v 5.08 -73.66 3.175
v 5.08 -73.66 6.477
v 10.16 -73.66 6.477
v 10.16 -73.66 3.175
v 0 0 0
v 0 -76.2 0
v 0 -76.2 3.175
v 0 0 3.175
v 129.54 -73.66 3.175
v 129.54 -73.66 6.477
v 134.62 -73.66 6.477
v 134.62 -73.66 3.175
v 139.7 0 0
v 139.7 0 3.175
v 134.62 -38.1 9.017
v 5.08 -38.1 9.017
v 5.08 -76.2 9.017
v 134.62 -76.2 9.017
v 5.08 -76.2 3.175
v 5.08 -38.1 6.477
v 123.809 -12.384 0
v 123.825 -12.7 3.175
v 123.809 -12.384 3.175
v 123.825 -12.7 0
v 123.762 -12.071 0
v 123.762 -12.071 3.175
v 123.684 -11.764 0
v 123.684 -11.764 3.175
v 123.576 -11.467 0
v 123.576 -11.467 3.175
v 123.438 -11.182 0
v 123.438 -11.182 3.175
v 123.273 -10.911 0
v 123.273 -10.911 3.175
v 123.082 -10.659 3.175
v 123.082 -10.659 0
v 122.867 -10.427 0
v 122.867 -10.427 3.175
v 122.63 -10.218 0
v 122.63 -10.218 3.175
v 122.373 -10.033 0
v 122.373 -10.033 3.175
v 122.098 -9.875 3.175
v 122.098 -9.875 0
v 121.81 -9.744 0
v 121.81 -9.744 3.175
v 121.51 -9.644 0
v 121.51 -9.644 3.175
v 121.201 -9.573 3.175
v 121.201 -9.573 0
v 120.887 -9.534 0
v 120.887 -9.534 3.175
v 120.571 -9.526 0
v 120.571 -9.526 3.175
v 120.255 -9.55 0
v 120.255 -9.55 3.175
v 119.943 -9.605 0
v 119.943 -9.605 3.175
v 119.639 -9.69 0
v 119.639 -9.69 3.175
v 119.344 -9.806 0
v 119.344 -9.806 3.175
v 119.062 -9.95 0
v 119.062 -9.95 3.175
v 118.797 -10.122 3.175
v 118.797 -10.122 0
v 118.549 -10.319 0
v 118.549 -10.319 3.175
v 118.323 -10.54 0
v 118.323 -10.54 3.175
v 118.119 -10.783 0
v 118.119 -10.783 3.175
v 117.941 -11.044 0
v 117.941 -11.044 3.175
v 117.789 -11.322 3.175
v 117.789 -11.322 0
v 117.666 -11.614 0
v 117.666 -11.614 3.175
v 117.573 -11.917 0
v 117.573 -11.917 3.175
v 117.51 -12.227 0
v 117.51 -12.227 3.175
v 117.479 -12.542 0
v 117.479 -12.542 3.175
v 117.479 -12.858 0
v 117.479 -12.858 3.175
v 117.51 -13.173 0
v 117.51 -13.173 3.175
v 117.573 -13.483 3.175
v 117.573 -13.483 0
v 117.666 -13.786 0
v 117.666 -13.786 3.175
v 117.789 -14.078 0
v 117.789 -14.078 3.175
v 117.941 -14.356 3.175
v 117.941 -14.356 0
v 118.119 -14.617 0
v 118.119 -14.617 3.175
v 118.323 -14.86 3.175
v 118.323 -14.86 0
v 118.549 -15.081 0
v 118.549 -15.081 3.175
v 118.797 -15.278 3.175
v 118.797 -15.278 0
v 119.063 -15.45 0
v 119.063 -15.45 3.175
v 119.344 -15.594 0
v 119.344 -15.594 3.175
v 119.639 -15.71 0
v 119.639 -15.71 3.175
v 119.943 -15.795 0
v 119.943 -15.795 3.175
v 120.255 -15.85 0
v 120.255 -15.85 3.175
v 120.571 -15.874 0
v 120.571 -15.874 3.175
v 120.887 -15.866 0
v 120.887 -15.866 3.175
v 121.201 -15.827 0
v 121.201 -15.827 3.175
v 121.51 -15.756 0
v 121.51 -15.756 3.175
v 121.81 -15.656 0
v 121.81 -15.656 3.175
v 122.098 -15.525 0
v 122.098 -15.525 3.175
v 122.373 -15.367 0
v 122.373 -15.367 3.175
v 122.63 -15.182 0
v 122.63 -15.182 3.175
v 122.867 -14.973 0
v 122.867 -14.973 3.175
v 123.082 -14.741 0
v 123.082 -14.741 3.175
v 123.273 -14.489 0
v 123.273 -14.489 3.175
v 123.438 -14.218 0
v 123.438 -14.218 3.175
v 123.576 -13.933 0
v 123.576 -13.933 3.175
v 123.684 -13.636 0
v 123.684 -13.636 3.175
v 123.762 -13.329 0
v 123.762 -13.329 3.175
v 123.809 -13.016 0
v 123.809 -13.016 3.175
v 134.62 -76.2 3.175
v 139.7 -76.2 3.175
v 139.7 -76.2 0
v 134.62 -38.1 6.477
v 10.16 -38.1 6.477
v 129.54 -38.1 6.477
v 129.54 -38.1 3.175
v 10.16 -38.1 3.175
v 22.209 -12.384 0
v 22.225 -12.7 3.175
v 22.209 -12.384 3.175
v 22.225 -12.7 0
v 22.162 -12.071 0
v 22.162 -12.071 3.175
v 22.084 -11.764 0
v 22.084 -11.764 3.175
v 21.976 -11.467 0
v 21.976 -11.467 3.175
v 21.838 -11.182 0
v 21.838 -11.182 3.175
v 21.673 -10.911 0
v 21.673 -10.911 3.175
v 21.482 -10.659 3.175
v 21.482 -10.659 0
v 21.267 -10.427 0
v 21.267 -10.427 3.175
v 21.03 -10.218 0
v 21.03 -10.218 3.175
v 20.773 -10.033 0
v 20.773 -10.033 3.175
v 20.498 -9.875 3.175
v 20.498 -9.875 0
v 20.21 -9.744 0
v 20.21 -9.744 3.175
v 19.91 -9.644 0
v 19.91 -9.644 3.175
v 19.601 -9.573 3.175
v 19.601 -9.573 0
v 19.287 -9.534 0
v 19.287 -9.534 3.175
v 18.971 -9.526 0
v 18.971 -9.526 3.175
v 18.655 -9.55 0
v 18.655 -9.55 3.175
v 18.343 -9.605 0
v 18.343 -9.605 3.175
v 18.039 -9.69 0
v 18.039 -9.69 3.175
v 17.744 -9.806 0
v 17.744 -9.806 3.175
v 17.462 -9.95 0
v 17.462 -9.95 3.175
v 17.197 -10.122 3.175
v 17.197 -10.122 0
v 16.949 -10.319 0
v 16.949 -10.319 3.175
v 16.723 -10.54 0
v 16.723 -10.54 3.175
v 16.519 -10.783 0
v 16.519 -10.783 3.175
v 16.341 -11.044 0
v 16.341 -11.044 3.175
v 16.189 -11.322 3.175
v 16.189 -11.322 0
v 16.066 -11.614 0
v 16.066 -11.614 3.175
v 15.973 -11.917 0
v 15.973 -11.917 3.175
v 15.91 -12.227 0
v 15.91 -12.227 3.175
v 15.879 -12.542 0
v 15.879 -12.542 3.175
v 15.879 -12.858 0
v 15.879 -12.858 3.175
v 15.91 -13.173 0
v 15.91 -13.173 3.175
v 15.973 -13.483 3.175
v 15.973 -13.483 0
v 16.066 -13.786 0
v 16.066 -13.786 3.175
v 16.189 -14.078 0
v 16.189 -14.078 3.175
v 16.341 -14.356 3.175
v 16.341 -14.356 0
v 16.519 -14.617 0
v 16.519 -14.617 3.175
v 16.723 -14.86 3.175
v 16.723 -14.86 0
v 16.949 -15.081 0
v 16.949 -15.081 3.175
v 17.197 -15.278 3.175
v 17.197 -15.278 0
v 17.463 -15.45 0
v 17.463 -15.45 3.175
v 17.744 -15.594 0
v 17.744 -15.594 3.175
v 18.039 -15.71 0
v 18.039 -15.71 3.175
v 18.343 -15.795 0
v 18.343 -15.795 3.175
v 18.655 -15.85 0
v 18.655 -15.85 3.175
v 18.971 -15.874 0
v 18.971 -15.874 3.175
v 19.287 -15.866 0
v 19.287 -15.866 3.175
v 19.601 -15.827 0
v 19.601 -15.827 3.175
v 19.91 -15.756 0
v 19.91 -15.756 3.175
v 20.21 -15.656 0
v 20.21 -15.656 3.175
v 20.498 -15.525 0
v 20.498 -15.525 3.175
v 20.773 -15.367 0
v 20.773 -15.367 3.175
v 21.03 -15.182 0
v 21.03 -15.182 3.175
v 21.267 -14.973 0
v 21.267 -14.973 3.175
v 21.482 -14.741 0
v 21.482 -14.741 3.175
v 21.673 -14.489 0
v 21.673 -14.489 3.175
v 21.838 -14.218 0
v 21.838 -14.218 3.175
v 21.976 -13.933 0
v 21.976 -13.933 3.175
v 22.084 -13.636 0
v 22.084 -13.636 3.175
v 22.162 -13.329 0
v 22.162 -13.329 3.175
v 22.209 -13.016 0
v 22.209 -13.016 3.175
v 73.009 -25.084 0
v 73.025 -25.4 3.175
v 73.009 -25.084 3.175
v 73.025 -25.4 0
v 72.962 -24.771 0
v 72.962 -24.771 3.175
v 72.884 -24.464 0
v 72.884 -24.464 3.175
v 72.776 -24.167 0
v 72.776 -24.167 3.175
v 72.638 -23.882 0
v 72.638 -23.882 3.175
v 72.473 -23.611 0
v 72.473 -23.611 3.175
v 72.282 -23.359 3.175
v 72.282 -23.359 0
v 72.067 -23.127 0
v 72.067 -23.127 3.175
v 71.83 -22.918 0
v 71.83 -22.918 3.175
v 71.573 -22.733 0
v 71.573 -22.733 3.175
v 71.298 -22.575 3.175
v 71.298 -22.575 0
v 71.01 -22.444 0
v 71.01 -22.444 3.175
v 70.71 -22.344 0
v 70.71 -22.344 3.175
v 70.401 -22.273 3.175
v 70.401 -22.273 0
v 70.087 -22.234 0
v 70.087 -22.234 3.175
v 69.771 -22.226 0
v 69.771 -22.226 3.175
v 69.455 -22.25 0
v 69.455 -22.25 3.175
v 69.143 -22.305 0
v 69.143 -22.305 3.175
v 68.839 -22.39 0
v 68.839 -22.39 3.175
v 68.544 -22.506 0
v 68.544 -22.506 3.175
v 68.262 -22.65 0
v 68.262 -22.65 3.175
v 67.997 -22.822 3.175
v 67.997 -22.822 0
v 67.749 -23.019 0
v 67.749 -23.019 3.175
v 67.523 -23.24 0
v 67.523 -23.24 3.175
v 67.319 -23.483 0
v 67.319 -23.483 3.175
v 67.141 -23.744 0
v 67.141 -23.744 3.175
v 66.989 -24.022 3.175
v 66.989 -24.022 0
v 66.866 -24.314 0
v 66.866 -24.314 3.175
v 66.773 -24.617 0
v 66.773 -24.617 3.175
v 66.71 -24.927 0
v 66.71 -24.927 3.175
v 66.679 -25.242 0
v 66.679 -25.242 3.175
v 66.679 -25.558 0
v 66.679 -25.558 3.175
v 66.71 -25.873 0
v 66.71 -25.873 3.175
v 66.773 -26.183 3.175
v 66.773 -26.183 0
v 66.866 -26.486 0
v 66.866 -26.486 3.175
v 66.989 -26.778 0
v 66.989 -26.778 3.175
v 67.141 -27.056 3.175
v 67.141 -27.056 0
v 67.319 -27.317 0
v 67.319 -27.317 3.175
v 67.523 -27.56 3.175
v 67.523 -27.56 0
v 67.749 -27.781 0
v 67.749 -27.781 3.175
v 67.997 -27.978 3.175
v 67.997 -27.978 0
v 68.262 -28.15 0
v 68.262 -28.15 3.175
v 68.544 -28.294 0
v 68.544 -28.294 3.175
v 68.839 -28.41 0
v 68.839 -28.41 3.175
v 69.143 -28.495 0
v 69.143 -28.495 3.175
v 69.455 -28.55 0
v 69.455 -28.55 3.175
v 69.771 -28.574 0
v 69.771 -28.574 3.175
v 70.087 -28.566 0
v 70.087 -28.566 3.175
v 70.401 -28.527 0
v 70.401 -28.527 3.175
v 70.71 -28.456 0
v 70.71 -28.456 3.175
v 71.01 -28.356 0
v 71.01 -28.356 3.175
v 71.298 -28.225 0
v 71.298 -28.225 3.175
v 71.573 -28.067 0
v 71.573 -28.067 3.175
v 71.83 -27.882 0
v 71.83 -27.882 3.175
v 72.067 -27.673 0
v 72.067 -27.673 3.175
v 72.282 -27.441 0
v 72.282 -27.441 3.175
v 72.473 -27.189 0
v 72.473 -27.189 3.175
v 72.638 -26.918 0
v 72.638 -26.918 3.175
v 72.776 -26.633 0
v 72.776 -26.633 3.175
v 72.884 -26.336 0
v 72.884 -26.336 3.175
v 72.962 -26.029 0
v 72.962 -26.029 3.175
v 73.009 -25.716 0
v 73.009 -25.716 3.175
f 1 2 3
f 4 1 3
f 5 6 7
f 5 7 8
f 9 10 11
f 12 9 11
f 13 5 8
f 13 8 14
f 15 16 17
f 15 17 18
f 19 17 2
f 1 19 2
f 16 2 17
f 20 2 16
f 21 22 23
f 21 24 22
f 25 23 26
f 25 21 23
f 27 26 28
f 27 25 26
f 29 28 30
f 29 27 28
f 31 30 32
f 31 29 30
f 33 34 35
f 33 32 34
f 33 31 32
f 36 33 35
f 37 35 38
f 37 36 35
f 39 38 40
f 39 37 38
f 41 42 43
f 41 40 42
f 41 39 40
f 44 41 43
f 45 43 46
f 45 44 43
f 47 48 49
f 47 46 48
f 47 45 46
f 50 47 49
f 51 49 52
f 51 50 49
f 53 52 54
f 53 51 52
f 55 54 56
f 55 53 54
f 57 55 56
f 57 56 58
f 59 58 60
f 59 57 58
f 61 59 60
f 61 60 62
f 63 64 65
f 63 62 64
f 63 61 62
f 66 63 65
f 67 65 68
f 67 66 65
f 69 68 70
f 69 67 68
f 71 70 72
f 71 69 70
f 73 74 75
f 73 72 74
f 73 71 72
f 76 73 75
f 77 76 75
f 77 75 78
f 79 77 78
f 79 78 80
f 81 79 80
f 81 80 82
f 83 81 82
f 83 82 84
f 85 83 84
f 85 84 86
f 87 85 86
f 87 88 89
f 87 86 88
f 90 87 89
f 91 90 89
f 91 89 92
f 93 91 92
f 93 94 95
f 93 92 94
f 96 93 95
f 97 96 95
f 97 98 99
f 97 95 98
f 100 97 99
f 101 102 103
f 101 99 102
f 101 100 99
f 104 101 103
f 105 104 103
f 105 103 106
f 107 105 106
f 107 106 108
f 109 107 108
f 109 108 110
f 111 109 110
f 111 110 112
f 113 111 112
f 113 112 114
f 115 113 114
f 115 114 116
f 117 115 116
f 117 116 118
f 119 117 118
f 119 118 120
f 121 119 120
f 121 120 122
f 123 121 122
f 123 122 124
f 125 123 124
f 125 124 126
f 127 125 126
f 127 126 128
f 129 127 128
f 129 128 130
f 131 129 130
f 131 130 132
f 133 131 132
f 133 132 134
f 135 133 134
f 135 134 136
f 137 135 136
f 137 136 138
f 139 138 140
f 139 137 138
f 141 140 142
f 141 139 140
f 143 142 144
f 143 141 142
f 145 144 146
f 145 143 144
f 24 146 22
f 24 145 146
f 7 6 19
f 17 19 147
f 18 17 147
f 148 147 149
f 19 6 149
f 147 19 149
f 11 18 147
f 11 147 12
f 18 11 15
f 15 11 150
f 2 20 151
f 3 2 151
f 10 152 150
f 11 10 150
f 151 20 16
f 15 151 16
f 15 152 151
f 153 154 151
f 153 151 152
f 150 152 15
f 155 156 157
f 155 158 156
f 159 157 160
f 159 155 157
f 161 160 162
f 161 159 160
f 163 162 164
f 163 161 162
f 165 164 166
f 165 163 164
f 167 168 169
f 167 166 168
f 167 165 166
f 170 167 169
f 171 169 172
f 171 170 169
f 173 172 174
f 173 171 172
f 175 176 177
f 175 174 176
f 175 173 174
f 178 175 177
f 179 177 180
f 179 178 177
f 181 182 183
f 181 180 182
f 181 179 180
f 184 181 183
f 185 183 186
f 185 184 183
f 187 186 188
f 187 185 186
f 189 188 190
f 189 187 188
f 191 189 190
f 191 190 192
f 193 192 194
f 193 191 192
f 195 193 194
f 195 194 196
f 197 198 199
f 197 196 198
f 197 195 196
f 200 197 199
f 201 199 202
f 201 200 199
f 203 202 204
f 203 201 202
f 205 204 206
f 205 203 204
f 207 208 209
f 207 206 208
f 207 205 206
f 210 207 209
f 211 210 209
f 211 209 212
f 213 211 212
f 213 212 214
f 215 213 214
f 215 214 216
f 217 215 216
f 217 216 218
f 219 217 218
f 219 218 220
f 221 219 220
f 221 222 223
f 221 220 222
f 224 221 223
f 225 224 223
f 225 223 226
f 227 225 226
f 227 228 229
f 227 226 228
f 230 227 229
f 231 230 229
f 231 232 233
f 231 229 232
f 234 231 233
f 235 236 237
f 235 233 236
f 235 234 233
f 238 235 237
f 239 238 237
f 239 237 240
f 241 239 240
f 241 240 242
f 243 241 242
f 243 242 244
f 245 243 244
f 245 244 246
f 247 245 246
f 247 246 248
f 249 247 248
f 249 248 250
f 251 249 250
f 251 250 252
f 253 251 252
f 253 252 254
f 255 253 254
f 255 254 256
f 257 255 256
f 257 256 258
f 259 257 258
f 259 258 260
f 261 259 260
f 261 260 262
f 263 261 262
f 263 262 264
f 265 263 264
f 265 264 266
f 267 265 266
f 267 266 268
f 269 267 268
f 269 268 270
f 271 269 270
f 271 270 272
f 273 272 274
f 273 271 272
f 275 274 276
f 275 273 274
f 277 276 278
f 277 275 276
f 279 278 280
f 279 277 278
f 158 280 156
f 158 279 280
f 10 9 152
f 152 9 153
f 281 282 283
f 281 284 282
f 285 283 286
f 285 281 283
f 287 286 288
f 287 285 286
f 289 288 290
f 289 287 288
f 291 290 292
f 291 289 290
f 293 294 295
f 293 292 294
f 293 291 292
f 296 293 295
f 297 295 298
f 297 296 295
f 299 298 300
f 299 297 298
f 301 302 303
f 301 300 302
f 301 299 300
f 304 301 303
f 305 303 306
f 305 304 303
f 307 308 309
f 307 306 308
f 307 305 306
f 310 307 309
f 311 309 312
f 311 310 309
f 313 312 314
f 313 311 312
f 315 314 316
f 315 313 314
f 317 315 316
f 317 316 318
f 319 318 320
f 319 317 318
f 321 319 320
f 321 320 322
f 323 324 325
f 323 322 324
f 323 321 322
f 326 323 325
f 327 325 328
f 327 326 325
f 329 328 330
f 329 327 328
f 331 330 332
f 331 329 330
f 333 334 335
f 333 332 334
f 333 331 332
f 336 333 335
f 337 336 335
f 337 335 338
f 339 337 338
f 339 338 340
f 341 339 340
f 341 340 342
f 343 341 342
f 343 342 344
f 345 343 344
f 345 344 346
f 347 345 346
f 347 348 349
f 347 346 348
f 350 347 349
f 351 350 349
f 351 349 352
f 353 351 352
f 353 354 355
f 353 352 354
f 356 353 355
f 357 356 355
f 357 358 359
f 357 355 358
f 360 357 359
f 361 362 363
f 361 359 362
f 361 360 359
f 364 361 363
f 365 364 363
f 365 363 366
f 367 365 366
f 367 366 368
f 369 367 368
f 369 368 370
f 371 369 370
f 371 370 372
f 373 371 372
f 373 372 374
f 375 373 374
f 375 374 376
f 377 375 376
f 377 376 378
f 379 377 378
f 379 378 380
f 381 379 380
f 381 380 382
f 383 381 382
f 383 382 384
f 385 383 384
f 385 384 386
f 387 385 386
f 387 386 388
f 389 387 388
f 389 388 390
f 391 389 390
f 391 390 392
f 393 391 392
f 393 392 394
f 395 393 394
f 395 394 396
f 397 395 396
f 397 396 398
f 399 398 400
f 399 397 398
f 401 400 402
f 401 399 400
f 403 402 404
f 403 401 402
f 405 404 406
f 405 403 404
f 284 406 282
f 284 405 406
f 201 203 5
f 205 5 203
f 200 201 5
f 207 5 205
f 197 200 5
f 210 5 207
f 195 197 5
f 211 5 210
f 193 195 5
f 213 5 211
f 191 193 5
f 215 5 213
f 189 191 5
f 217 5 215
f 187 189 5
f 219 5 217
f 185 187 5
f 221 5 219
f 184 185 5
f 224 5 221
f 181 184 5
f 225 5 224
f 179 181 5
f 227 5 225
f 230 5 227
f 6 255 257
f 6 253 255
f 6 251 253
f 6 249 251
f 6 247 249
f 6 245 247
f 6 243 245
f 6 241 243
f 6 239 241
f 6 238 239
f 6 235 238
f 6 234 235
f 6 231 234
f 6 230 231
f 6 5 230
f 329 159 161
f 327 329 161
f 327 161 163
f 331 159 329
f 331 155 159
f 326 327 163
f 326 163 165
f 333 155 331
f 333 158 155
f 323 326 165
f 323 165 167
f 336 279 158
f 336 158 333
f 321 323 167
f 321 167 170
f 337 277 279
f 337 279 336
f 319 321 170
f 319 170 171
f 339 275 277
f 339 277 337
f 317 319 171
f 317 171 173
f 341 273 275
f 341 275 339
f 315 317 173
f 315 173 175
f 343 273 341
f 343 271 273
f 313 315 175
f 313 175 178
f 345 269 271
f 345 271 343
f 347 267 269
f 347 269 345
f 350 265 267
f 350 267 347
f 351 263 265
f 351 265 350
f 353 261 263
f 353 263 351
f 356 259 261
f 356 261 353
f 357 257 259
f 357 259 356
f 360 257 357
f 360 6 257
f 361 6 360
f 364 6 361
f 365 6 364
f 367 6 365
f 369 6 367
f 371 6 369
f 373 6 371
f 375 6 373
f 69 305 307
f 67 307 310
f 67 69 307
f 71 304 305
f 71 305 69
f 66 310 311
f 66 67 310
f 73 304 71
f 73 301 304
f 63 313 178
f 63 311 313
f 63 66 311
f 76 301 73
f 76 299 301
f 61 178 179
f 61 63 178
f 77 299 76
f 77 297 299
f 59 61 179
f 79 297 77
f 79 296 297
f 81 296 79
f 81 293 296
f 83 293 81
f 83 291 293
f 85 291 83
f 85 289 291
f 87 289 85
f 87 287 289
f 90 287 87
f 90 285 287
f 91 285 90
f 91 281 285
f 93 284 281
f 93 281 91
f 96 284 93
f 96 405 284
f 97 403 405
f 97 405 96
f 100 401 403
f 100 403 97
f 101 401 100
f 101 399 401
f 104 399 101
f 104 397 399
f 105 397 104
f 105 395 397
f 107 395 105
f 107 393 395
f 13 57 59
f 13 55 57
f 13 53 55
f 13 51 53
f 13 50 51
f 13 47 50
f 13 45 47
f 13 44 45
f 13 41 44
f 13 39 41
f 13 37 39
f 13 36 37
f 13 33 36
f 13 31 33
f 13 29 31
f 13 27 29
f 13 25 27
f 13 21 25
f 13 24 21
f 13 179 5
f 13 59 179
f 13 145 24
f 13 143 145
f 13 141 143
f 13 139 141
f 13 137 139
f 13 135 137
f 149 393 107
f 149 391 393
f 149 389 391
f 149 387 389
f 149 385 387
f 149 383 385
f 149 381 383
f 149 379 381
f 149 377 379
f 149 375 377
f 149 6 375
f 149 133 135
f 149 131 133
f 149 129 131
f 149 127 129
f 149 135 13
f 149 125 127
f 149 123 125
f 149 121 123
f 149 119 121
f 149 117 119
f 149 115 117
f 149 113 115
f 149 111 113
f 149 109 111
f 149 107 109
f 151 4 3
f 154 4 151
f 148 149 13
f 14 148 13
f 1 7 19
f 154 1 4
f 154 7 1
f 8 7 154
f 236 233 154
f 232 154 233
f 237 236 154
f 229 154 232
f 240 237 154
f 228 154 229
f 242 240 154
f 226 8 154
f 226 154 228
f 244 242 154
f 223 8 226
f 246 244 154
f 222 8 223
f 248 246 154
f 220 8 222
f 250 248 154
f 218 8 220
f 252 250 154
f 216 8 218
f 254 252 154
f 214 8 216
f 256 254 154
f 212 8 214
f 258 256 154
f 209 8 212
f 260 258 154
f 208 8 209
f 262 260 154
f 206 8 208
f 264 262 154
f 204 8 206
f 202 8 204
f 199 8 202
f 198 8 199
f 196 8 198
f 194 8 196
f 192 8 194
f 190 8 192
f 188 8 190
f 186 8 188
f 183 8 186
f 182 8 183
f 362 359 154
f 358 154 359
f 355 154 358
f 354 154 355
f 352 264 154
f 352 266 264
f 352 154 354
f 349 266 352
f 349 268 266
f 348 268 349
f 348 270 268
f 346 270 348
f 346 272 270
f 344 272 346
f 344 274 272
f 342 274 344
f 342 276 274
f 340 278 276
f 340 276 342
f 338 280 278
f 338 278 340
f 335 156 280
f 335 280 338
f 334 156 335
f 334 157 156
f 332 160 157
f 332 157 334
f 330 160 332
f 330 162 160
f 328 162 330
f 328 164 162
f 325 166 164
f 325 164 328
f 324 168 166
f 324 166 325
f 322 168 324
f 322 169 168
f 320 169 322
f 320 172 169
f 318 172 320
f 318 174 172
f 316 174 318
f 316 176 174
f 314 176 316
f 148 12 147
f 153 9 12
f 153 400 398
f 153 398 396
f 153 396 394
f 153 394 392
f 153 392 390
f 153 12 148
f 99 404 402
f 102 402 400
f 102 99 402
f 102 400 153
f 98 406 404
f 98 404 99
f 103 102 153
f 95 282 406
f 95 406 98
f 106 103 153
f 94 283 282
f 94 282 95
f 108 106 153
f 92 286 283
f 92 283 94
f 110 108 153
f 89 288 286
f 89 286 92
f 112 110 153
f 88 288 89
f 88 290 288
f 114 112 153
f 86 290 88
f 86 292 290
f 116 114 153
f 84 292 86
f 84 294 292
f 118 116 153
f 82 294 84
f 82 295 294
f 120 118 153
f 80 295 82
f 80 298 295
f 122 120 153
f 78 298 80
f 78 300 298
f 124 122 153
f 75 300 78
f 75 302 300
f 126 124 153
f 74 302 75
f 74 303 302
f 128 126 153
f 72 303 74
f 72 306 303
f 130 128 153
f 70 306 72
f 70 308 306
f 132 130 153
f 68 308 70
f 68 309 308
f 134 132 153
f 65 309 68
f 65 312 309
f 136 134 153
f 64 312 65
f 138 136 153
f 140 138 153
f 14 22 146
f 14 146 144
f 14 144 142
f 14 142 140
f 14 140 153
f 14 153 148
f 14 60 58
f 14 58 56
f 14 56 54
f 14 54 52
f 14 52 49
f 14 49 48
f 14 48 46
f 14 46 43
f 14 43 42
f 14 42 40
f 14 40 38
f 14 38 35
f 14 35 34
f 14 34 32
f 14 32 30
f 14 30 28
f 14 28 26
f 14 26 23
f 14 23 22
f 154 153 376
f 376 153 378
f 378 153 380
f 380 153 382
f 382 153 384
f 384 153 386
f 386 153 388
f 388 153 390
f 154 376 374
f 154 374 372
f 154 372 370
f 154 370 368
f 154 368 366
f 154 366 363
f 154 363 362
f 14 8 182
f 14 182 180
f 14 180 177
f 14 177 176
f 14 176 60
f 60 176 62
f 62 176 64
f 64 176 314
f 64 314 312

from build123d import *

# Parameters (mm, degrees)
SKETCH3_W               = 139.7
SKETCH3_H               = 76.2
BOSS_EXTRUDE1_DEPTH     = 3.175
SKETCH4_W               = 119.38
SKETCH4_H               = 38.1
BOSS_EXTRUDE2_DEPTH     = 3.302
SKETCH6_W               = 129.54
SKETCH6_H               = 38.1
BOSS_EXTRUDE3_DEPTH     = 2.54
SKETCH7_W               = 129.54
SKETCH7_H               = 9.017
BOSS_EXTRUDE4_DEPTH     = 2.54
CUT_EXTRUDE1_DEPTH      = 160.237743528
CUT_EXTRUDE1_DEPTH_BACK = 160.237743528
SKETCH8_R               = 3.175


with BuildPart() as part:
    # Sketch3 → Boss-Extrude1 (new body)
    with BuildSketch(Plane.XY):
        with Locations((69.85, -38.1)):
            Rectangle(SKETCH3_W, SKETCH3_H)
    extrude(amount=BOSS_EXTRUDE1_DEPTH)

    # Sketch4 → Boss-Extrude2 (add)
    with BuildSketch(Plane.XY.offset(3.175)):
        with Locations((69.85, -57.15)):
            Rectangle(SKETCH4_W, SKETCH4_H)
    extrude(amount=BOSS_EXTRUDE2_DEPTH)

    # Sketch6 → Boss-Extrude3 (add)
    with BuildSketch(Plane.XY.offset(6.477)):
        with Locations((69.85, -57.15)):
            Rectangle(SKETCH6_W, SKETCH6_H)
    extrude(amount=BOSS_EXTRUDE3_DEPTH)

    # Sketch7 → Boss-Extrude4 (add)
    with BuildSketch(Plane.XZ.offset(76.2)):
        with Locations((69.85, 4.5085)):
            Rectangle(SKETCH7_W, SKETCH7_H)
    extrude(amount=-BOSS_EXTRUDE4_DEPTH)

    # Sketch8 → Cut-Extrude1 (cut, two sides: drawn at the far end of the back side and taken through both)
    with BuildSketch(Plane.XY.offset(3.175).offset(-CUT_EXTRUDE1_DEPTH_BACK)):
        with Locations((19.05, -12.7)):
            Circle(SKETCH8_R)
        with Locations((69.85, -25.4)):
            Circle(SKETCH8_R)
        with Locations((120.65, -12.7)):
            Circle(SKETCH8_R)
    extrude(amount=CUT_EXTRUDE1_DEPTH + CUT_EXTRUDE1_DEPTH_BACK, mode=Mode.SUBTRACT)


solid = part.part
